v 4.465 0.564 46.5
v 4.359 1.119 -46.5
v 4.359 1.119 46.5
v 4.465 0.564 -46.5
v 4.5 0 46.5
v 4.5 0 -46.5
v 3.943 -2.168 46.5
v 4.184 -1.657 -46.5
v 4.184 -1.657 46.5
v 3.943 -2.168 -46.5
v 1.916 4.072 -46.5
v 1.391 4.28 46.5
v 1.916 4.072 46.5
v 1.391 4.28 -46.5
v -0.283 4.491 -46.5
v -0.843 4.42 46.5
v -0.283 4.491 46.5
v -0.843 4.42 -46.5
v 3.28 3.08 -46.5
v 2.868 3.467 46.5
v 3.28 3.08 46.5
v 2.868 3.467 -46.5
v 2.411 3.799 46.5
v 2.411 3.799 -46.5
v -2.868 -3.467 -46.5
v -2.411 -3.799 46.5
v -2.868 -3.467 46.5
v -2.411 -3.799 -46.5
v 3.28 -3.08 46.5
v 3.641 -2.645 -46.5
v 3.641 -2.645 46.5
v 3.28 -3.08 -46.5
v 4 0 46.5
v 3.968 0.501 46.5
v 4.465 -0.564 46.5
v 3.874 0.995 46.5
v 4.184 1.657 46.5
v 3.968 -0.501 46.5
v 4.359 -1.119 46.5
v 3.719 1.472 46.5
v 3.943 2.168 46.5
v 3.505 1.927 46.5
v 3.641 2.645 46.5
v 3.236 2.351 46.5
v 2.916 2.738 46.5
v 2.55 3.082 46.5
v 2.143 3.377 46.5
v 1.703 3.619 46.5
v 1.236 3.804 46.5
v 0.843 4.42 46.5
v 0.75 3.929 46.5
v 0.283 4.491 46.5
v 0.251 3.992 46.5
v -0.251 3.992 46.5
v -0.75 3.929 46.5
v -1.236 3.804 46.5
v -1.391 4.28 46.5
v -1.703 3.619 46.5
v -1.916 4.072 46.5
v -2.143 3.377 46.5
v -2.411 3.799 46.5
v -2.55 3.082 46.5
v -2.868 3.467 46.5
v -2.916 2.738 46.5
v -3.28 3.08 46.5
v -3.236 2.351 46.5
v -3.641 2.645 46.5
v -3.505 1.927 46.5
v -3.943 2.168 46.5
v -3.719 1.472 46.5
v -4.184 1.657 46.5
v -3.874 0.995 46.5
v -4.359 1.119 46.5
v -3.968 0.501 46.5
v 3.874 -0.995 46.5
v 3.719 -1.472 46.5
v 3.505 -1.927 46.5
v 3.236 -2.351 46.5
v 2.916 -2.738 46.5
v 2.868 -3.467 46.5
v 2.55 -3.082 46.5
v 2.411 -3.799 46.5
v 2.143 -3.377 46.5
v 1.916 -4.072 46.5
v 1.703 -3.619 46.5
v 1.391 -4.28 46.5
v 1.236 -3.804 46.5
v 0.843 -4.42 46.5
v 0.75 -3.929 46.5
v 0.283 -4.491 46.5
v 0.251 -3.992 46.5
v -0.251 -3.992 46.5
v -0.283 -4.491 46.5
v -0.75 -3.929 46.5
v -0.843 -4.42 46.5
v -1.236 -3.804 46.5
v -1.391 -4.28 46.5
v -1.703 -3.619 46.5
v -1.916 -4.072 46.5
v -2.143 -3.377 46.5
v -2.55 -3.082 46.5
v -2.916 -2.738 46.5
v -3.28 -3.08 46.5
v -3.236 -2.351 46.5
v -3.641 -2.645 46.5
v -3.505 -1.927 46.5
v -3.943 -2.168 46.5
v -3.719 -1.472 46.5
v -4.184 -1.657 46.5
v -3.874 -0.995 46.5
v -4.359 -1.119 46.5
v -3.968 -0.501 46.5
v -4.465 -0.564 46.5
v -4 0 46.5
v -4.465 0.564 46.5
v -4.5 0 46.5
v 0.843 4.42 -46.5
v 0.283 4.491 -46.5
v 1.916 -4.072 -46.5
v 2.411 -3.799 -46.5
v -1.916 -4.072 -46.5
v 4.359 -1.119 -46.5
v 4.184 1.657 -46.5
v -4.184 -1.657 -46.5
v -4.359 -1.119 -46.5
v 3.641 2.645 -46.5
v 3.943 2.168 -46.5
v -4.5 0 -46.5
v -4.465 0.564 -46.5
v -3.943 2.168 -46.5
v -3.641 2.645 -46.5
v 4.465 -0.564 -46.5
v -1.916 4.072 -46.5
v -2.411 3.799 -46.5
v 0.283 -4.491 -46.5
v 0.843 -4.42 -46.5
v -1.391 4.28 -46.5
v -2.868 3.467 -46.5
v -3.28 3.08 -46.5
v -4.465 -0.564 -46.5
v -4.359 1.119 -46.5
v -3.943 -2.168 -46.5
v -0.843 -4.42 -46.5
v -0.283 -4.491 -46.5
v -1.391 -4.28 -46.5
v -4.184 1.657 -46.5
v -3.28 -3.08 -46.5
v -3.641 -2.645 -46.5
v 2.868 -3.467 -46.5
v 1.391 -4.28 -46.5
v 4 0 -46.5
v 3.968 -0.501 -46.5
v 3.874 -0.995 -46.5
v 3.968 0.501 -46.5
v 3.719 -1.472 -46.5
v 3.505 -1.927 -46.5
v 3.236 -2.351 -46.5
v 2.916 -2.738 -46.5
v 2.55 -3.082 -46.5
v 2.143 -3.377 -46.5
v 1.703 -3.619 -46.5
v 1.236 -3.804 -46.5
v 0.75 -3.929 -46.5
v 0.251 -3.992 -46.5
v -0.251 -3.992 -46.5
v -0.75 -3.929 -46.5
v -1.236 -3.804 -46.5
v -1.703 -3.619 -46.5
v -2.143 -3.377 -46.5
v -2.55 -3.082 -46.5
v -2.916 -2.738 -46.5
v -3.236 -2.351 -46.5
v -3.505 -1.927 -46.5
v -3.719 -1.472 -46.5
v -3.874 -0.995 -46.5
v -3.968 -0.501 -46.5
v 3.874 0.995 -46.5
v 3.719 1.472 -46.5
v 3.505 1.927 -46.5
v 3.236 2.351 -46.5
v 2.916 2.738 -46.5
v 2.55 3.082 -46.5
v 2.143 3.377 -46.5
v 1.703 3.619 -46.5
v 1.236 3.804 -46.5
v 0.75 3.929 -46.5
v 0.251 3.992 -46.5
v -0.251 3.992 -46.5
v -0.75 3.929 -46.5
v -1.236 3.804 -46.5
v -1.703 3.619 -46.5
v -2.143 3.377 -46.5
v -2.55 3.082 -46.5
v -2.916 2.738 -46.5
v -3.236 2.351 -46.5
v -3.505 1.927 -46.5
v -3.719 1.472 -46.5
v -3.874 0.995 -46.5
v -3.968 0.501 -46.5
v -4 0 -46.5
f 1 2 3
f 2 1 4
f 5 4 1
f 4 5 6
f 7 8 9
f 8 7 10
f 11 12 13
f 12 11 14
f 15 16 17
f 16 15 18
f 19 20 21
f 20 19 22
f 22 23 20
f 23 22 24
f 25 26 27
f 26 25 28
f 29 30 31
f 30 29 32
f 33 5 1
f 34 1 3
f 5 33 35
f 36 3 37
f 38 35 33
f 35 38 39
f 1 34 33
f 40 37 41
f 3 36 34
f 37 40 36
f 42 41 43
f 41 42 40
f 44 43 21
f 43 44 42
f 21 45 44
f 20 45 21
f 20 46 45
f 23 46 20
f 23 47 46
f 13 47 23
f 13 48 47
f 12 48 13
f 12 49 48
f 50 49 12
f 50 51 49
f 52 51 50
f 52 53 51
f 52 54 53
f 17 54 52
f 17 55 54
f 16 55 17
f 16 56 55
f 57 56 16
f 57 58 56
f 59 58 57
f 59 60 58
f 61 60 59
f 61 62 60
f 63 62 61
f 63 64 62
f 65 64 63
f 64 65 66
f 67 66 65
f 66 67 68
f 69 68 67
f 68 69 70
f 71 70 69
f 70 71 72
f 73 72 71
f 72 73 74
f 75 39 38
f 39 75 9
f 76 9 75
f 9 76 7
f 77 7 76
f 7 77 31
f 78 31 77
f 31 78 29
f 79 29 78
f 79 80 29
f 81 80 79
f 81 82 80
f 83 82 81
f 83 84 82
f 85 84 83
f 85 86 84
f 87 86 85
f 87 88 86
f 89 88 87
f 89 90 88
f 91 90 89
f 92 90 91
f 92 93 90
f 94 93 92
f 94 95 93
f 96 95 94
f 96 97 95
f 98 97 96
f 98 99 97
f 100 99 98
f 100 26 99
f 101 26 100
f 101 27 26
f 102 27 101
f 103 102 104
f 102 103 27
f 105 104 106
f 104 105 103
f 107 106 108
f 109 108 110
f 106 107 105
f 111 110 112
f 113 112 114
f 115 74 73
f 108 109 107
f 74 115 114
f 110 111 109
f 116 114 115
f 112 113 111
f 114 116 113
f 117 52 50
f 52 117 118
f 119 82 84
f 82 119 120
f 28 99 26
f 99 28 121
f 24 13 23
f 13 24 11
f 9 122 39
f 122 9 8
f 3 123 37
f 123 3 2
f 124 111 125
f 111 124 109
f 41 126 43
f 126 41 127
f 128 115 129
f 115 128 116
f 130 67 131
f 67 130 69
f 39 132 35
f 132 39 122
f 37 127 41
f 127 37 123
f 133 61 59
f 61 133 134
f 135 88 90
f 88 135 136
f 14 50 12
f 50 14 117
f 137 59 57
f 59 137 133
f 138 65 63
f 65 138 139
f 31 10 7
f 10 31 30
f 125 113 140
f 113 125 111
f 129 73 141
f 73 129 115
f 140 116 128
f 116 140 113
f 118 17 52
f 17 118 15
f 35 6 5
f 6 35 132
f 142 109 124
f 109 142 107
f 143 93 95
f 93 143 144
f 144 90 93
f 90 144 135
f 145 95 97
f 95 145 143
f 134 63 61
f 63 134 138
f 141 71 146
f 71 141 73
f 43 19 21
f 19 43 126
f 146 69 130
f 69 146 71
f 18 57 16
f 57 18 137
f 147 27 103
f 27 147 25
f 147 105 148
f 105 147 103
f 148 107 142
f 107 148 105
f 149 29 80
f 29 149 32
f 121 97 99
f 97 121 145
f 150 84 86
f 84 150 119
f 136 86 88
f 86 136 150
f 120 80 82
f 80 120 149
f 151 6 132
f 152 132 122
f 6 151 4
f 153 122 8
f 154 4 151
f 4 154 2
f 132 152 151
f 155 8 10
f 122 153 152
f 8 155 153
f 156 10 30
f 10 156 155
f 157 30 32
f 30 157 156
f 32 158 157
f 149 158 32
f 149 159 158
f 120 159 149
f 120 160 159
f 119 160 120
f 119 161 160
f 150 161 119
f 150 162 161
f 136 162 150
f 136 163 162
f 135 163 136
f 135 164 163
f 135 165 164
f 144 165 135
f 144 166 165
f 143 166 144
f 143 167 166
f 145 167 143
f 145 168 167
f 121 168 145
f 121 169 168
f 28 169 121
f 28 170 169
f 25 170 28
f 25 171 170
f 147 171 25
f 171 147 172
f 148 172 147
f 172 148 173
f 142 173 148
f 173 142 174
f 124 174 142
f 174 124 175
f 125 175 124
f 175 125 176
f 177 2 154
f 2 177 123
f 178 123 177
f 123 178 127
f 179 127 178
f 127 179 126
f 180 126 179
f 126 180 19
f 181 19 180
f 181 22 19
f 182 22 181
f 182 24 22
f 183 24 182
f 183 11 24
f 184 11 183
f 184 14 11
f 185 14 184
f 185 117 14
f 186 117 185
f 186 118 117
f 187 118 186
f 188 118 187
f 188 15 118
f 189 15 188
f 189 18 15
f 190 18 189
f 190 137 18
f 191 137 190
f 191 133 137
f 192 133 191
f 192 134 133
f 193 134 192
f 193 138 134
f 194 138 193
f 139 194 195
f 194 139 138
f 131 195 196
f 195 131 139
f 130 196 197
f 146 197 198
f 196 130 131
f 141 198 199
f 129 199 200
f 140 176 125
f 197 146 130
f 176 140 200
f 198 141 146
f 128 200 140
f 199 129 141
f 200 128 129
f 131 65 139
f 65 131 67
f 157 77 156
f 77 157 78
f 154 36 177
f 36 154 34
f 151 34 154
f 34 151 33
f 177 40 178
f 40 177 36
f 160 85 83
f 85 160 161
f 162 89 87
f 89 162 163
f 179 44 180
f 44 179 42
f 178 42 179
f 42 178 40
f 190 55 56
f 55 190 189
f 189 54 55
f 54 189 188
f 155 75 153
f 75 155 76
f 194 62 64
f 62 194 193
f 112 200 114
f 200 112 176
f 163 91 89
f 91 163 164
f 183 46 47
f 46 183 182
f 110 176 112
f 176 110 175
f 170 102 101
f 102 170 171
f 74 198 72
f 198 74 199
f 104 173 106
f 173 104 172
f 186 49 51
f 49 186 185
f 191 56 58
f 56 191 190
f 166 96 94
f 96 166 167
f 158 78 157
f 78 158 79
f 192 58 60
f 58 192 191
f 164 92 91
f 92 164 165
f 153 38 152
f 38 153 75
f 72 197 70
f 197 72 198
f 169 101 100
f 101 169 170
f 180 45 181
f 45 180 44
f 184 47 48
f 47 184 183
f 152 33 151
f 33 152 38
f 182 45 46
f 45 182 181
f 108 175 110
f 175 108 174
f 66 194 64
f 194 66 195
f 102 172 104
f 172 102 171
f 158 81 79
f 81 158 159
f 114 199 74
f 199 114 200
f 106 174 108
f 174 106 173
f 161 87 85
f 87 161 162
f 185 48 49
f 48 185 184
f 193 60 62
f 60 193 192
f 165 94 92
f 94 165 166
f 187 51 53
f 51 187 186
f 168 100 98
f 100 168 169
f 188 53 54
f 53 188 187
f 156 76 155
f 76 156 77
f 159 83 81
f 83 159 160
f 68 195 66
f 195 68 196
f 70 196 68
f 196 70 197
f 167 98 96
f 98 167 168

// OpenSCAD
$fn = 50;


difference() {
	union() {
		translate(v = [0, 0, -46.5000000000]) {
			cylinder(h = 93, r = 4.5000000000);
		}
	}
	union() {
		translate(v = [0, 0, -100.0000000000]) {
			cylinder(h = 200, r = 4.0000000000);
		}
	}
}
